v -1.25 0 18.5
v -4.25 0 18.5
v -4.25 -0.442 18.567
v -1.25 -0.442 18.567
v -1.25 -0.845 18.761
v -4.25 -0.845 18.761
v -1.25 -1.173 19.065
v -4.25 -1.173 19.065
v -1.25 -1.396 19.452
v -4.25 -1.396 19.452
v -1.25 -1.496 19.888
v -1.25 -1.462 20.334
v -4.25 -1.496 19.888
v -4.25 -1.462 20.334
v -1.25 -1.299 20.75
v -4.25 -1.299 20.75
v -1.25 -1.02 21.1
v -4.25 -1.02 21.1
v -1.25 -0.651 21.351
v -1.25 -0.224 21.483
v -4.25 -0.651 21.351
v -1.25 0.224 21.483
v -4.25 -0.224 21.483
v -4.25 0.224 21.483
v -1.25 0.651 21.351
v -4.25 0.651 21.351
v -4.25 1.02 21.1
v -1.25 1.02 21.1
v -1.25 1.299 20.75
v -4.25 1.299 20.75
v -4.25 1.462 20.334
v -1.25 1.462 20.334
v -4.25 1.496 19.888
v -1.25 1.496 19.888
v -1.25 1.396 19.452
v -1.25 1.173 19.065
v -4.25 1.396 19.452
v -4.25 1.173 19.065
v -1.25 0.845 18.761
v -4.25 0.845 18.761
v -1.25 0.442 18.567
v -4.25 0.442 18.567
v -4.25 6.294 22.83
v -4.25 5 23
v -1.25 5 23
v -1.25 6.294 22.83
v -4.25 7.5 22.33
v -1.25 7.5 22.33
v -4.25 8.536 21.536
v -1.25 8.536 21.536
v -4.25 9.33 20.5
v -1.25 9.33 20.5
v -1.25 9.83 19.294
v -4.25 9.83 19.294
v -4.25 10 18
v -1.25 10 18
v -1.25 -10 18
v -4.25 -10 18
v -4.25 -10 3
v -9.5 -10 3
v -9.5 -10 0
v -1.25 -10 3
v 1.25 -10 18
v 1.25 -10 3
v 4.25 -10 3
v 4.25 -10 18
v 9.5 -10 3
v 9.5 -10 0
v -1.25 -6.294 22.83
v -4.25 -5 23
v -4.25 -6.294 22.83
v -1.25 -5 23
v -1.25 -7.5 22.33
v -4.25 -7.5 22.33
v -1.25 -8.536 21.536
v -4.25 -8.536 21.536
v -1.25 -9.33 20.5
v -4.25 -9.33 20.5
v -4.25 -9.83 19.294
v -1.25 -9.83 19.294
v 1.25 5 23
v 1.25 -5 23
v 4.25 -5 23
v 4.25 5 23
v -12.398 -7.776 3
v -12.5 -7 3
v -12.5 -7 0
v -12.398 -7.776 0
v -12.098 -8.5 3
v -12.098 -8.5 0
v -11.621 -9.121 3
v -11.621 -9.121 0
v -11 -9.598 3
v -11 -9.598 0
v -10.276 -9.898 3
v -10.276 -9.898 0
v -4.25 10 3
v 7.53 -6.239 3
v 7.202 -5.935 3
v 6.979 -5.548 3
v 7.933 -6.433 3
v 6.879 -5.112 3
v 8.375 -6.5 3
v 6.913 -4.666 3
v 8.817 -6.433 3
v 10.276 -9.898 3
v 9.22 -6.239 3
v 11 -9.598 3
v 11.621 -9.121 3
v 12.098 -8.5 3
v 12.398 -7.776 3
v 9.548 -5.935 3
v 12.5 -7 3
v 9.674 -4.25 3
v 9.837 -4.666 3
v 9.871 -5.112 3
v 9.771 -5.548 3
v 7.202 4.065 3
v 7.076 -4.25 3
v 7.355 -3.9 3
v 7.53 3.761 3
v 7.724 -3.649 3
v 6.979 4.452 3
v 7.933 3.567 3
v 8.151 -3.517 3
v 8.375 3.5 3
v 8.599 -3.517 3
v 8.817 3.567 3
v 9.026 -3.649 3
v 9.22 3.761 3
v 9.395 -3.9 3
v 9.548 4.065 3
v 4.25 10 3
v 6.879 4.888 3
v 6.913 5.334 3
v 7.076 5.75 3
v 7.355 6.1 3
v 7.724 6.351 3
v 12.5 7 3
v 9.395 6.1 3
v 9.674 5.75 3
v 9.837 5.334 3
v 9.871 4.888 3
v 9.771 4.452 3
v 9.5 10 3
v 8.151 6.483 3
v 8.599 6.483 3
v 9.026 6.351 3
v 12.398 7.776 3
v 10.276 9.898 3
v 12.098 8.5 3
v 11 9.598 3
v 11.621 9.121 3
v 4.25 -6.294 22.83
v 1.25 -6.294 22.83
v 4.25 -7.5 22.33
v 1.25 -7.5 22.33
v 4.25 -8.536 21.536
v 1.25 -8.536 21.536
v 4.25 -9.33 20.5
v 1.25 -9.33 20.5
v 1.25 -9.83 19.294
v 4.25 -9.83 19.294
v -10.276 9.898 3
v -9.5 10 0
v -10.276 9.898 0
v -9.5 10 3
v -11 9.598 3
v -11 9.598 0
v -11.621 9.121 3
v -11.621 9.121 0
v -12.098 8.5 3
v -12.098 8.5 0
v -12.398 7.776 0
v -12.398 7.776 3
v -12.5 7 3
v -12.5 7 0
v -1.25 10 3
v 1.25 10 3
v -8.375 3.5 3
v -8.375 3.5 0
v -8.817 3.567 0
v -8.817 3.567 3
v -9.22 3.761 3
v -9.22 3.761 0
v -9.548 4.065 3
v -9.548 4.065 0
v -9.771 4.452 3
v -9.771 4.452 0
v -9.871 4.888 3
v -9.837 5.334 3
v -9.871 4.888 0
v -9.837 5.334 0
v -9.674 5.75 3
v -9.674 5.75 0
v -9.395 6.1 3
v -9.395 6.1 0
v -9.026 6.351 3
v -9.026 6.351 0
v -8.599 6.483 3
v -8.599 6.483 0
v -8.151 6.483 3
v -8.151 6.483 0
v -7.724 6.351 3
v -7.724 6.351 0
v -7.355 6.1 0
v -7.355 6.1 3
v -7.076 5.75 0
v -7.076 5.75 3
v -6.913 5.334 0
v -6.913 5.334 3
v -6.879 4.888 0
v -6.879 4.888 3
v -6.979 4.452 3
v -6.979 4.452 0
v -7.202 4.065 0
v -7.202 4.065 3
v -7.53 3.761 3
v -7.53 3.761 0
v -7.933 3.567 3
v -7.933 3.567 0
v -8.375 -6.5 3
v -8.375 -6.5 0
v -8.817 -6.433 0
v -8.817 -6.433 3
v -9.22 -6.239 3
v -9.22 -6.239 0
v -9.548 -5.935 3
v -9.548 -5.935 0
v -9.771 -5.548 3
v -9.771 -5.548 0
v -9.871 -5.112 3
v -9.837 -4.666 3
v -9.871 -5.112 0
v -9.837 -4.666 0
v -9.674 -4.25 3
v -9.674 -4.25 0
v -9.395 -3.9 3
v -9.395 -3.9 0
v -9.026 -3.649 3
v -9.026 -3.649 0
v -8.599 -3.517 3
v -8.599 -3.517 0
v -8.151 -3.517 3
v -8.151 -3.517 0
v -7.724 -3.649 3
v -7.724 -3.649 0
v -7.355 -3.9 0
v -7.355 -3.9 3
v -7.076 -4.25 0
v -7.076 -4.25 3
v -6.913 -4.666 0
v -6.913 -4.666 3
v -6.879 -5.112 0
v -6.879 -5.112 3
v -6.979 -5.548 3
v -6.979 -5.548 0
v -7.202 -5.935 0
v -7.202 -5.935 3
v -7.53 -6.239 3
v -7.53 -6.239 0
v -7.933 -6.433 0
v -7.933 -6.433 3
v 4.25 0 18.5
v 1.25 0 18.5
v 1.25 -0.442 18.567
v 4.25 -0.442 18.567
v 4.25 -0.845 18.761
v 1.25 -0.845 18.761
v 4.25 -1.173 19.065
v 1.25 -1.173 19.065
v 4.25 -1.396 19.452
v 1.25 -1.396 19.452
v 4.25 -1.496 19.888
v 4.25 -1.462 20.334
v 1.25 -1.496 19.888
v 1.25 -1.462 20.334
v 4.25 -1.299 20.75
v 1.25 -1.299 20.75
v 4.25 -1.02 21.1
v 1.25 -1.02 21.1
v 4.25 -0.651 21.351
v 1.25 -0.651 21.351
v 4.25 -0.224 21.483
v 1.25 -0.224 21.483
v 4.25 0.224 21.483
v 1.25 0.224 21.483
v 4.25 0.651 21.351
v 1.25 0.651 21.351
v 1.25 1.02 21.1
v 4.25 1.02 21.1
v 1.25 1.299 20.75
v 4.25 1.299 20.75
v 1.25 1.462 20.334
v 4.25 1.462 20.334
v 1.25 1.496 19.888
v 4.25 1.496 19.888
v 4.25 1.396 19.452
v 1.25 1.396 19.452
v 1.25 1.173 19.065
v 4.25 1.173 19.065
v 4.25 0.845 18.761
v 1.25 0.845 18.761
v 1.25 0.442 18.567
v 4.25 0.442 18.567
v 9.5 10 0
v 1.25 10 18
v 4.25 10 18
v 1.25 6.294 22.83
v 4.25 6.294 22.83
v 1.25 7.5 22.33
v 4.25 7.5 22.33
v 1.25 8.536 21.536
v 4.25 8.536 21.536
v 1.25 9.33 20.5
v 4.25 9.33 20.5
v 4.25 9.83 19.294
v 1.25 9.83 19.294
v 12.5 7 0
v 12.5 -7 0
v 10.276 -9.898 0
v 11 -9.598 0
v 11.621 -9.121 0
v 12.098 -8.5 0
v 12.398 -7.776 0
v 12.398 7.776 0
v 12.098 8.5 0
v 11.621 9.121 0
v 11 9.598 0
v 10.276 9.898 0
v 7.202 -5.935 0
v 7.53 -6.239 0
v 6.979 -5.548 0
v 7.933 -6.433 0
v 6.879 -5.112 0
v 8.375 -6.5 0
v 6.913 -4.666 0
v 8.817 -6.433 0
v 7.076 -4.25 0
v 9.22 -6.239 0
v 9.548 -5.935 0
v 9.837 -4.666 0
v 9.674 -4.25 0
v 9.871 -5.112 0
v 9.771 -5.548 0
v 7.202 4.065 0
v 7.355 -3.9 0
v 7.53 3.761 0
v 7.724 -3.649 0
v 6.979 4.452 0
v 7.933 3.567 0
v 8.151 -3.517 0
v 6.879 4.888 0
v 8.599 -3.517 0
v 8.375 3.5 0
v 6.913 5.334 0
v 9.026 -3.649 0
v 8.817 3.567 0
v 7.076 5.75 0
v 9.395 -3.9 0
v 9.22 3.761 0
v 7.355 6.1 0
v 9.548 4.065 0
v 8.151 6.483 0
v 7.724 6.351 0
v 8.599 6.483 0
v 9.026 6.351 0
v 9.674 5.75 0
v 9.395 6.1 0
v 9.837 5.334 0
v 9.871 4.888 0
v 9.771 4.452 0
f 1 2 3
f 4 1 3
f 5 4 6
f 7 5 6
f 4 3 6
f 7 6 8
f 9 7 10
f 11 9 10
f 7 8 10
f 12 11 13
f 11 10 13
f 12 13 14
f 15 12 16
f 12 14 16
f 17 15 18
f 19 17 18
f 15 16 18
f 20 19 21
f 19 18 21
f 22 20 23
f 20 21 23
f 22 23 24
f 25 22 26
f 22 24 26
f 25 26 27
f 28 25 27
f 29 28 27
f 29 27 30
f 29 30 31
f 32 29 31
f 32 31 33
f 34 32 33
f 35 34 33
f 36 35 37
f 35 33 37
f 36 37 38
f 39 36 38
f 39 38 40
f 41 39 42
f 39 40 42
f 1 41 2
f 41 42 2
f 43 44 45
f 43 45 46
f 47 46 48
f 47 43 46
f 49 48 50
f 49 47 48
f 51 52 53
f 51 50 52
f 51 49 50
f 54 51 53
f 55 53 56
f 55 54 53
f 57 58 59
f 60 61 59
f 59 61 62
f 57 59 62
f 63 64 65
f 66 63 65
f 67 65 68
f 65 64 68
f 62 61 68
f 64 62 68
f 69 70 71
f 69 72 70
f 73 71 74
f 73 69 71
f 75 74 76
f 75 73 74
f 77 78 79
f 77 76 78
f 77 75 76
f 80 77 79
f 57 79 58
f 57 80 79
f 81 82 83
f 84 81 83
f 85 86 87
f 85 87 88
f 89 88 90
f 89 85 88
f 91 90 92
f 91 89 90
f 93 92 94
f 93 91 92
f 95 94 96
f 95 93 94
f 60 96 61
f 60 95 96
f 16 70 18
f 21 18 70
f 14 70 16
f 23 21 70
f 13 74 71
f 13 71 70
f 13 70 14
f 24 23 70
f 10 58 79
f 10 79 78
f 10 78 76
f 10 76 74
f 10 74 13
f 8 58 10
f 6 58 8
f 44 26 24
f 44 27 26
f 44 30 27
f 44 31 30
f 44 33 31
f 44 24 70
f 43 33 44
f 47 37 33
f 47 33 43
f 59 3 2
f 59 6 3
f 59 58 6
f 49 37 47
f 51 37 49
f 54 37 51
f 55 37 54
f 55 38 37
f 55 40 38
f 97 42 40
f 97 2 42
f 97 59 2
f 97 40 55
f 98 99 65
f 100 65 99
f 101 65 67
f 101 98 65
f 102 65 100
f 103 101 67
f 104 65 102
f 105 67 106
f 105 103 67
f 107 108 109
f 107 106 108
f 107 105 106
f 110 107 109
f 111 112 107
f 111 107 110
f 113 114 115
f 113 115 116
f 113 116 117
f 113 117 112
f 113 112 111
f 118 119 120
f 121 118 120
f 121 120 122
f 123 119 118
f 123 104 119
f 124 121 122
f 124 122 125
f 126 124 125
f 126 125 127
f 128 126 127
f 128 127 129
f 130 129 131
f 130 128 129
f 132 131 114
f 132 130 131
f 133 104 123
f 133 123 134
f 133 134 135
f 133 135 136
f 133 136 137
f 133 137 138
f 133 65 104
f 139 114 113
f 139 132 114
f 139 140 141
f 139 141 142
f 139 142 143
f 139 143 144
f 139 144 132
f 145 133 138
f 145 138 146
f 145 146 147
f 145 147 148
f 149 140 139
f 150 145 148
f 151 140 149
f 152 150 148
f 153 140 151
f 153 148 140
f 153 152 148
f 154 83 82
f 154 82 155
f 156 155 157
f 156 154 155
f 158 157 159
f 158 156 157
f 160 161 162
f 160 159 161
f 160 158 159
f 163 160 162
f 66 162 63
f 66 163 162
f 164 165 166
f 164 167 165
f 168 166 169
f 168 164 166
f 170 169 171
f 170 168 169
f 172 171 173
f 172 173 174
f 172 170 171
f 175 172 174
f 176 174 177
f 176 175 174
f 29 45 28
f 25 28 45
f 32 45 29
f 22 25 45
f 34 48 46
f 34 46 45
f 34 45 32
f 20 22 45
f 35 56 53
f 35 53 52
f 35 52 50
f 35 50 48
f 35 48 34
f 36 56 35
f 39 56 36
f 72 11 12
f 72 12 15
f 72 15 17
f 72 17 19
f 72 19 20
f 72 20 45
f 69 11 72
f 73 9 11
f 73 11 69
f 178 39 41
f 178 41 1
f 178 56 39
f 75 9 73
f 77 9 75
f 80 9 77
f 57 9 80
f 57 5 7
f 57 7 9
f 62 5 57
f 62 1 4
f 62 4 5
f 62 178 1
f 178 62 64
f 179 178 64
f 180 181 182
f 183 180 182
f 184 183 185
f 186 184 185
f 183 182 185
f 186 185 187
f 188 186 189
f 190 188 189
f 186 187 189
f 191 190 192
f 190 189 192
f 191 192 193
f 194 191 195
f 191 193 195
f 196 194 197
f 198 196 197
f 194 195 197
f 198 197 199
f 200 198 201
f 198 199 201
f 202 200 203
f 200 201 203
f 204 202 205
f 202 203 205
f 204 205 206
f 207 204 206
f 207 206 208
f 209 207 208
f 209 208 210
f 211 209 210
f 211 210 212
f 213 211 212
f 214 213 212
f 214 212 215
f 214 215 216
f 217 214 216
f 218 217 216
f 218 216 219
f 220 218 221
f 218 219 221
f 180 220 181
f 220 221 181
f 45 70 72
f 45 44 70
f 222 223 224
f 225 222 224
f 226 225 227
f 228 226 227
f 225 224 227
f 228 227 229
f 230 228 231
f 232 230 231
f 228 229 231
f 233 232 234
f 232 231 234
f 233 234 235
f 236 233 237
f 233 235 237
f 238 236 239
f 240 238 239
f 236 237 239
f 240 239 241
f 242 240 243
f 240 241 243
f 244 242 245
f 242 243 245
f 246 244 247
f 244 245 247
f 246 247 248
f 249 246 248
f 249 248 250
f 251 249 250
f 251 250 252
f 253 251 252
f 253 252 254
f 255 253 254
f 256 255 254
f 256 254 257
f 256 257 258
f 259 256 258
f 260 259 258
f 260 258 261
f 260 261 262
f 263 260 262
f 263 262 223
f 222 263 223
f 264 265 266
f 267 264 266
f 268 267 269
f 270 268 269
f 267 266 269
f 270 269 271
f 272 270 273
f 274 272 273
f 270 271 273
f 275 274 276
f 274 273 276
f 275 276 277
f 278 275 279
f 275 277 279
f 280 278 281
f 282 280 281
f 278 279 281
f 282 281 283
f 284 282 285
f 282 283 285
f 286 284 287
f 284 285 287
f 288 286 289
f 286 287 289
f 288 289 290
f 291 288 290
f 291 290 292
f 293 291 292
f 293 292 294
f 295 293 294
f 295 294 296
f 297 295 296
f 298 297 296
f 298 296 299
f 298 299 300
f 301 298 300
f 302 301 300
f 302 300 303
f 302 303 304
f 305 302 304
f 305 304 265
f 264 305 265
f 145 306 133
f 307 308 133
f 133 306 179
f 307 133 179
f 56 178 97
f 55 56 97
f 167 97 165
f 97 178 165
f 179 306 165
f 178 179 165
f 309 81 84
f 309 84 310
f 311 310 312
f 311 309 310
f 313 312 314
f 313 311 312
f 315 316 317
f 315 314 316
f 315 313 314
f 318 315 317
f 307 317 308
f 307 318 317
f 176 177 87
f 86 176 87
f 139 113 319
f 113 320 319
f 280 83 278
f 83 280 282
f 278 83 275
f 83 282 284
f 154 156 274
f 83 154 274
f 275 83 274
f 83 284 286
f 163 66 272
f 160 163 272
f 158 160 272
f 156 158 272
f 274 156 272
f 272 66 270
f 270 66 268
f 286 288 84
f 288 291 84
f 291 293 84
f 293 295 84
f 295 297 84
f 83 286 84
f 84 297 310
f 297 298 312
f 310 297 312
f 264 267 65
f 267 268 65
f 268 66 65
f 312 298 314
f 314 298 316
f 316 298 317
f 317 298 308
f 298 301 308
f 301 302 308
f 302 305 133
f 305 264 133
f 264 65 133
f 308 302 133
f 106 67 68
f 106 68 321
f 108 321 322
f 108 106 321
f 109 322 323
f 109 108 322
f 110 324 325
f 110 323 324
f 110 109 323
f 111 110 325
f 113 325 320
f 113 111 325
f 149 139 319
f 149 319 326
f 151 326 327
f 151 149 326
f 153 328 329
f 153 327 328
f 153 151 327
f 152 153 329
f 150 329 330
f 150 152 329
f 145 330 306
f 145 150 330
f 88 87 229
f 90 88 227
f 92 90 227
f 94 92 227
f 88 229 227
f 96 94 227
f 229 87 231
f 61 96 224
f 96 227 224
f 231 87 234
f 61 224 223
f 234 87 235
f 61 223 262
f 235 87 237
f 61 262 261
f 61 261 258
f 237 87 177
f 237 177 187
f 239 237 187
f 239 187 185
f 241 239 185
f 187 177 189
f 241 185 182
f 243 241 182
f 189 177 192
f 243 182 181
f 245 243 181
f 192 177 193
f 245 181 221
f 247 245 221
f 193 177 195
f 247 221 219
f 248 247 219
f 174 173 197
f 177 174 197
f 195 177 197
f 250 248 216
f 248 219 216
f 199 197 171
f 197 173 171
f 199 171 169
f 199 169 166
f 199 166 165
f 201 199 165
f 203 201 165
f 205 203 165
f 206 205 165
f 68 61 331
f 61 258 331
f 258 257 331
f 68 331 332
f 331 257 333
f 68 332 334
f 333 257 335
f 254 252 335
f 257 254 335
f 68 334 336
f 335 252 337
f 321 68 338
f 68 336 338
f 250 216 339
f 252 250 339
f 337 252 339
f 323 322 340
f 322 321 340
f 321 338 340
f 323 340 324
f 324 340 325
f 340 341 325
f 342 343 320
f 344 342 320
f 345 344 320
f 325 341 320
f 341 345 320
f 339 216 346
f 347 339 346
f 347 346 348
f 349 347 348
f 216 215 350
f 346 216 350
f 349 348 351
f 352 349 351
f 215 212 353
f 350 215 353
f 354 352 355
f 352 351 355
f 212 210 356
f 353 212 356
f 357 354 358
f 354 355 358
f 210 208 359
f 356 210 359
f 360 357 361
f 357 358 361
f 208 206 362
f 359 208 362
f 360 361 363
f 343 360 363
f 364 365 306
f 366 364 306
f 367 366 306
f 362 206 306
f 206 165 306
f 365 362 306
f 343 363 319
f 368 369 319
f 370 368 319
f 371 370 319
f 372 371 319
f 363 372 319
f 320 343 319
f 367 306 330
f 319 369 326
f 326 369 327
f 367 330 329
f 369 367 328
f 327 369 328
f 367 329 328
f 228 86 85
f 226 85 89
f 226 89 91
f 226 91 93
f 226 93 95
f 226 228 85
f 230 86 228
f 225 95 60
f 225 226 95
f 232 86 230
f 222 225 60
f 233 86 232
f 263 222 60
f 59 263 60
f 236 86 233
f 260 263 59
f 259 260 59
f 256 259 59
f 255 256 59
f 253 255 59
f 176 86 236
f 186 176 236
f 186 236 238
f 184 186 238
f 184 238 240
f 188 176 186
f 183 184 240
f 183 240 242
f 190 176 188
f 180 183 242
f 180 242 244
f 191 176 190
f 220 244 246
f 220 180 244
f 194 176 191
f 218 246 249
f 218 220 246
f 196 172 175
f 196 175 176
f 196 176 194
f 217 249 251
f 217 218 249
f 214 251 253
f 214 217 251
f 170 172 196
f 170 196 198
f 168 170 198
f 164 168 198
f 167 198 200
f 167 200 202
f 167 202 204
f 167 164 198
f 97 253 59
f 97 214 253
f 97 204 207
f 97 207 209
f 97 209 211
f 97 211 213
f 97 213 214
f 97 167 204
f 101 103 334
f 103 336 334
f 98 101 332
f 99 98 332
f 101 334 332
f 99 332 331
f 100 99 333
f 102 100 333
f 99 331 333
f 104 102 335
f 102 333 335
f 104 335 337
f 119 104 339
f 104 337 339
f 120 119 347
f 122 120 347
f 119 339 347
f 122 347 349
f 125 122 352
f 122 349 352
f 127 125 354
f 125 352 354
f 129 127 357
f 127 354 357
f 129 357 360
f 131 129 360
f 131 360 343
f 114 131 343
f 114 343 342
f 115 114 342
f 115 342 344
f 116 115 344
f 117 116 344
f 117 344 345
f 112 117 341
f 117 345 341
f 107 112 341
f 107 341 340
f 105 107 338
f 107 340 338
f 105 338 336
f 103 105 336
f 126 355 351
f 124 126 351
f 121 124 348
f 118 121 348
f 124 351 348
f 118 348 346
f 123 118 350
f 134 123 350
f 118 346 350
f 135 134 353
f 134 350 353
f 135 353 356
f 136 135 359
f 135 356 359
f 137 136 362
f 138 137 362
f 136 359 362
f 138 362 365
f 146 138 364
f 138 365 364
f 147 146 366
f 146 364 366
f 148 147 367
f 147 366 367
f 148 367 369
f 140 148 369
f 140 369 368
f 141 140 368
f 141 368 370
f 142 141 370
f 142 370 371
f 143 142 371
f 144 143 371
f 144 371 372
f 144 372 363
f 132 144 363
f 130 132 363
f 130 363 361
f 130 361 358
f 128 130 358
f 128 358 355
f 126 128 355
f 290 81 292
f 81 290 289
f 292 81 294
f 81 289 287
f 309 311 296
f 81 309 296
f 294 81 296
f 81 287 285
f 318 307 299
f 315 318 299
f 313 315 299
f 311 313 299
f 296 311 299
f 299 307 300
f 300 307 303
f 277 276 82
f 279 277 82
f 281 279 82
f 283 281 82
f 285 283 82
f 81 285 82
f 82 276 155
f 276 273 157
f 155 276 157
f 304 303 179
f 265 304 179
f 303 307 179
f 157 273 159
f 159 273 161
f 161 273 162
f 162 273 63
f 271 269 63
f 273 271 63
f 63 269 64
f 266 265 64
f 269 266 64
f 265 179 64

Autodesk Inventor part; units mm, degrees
ref_plane "YZ Plane" through (0, 0, 0) normal (1, 0, 0) x (0, 1, 0)
ref_plane "XZ Plane" through (0, 0, 0) normal (0, 1, 0) x (-1, 0, 0)
ref_plane "XY Plane" through (0, 0, 0) normal (0, 0, 1) x (1, 0, 0)
sketch "Szkic1" plane through (0, 0, 0) normal (0, 0, 1) x (1, 0, 0)
  line L0 (-12.5, -10) -> (12.5, -10)
  line L1 (12.5, -10) -> (12.5, 10)
  line L2 (12.5, 10) -> (-12.5, 10)
  line L3 (-12.5, 10) -> (-12.5, -10)
  line L4 (-12.5, -10) -> (12.5, 10) construction
  line L5 (12.5, -10) -> (-12.5, 10) construction
  point P0 (0, 0)
  dimension "d0" = 25
  dimension "d1" = 20
extrude "Wyciągnięcie proste1" add sketch "Szkic1" along normal blind 3
sketch "Szkic2" plane through (0, 0, 3) normal (0, 0, 1) x (1, 0, 0)
  line L0 (1.25, -10) -> (4.25, -10)
  line L1 (4.25, -10) -> (4.25, 10)
  line L2 (4.25, 10) -> (1.25, 10)
  line L3 (1.25, 10) -> (1.25, -10)
  line L4 (1.25, -10) -> (4.25, 10) construction
  line L5 (4.25, -10) -> (1.25, 10) construction
  line L6 (-12.5, -10) -> (12.5, -10) projected
  line L7 (12.5, 10) -> (-12.5, 10) projected
  line L8 (0, 10) -> (0, -10) construction
  line L9 (-1.25, -10) -> (-4.25, -10)
  line L10 (-4.25, -10) -> (-4.25, 10)
  line L11 (-4.25, 10) -> (-1.25, 10)
  line L12 (-1.25, 10) -> (-1.25, -10)
  line L13 (-1.25, -10) -> (-4.25, 10) construction
  line L14 (-4.25, -10) -> (-1.25, 10) construction
  point P0 (0, 0)
  point P1 (2.75, 0)
  point P2 (-2.75, 0)
  dimension "d4" = 3
  dimension "d5" = 20
  dimension "d6" = 2.75
  dimension "d7" = 10
extrude "Wyciągnięcie proste2" add sketch "Szkic2" along normal blind 20 contours L3 L2 L1 L0 | L6 L10 L7 L12
sketch "Szkic3" plane through (4.25, -10, 3) normal (1, 0, 0) x (0, 0, -1)
  line L0 (-20, 0) -> (-20, 20) projected
  line L1 (0, 20) -> (-20, 20) projected
  point P0 (3, 10)
  point P1 (-17, 10)
  dimension "d10" = 3
  dimension "d11" = 10
hole "Otwór1" at (4.25, 0, 20) direction (-1, 0, 0) diameter 3 end through all
fillet "Zaokrąglenie1" radius 5 4 edges at (2.75, -10, 23) (-2.75, -10, 23) (-2.75, 10, 23) (2.75, 10, 23)
fillet "Zaokrąglenie2" radius 3 4 edges at (12.5, 10, 1.5) (12.5, -10, 1.5) (-12.5, -10, 1.5) (-12.5, 10, 1.5)
sketch "Szkic4" plane through (0, 0, 3) normal (0, 0, 1) x (1, 0, 0)
  line L0 (-12.5, 7) -> (-12.5, -7) projected
  line L1 (-9.5, -10) -> (-4.25, -10) projected
  line L2 (-1.25, -10) -> (1.25, -10) projected
  line L3 (0, -10) -> (0, 10) construction
  line L4 (1.25, 10) -> (-1.25, 10) projected
  line L5 (12.5, -7) -> (12.5, 7) projected
  line L6 (12.5, 0) -> (-12.5, 0) construction
  point P0 (0, 0)
  point P1 (-8.375, -5)
  point P2 (8.375, -5)
  point P3 (-8.375, 5)
  point P4 (8.375, 5)
  dimension "d21" = 4.125
  dimension "d22" = 5
hole "Otwór2" at (-8.375, -5, 3) at (8.375, -5, 3) at (8.375, 5, 3) at (-8.375, 5, 3) direction (0, 0, -1) diameter 3 end through all
properties part number "pleksi_mocowanie"
